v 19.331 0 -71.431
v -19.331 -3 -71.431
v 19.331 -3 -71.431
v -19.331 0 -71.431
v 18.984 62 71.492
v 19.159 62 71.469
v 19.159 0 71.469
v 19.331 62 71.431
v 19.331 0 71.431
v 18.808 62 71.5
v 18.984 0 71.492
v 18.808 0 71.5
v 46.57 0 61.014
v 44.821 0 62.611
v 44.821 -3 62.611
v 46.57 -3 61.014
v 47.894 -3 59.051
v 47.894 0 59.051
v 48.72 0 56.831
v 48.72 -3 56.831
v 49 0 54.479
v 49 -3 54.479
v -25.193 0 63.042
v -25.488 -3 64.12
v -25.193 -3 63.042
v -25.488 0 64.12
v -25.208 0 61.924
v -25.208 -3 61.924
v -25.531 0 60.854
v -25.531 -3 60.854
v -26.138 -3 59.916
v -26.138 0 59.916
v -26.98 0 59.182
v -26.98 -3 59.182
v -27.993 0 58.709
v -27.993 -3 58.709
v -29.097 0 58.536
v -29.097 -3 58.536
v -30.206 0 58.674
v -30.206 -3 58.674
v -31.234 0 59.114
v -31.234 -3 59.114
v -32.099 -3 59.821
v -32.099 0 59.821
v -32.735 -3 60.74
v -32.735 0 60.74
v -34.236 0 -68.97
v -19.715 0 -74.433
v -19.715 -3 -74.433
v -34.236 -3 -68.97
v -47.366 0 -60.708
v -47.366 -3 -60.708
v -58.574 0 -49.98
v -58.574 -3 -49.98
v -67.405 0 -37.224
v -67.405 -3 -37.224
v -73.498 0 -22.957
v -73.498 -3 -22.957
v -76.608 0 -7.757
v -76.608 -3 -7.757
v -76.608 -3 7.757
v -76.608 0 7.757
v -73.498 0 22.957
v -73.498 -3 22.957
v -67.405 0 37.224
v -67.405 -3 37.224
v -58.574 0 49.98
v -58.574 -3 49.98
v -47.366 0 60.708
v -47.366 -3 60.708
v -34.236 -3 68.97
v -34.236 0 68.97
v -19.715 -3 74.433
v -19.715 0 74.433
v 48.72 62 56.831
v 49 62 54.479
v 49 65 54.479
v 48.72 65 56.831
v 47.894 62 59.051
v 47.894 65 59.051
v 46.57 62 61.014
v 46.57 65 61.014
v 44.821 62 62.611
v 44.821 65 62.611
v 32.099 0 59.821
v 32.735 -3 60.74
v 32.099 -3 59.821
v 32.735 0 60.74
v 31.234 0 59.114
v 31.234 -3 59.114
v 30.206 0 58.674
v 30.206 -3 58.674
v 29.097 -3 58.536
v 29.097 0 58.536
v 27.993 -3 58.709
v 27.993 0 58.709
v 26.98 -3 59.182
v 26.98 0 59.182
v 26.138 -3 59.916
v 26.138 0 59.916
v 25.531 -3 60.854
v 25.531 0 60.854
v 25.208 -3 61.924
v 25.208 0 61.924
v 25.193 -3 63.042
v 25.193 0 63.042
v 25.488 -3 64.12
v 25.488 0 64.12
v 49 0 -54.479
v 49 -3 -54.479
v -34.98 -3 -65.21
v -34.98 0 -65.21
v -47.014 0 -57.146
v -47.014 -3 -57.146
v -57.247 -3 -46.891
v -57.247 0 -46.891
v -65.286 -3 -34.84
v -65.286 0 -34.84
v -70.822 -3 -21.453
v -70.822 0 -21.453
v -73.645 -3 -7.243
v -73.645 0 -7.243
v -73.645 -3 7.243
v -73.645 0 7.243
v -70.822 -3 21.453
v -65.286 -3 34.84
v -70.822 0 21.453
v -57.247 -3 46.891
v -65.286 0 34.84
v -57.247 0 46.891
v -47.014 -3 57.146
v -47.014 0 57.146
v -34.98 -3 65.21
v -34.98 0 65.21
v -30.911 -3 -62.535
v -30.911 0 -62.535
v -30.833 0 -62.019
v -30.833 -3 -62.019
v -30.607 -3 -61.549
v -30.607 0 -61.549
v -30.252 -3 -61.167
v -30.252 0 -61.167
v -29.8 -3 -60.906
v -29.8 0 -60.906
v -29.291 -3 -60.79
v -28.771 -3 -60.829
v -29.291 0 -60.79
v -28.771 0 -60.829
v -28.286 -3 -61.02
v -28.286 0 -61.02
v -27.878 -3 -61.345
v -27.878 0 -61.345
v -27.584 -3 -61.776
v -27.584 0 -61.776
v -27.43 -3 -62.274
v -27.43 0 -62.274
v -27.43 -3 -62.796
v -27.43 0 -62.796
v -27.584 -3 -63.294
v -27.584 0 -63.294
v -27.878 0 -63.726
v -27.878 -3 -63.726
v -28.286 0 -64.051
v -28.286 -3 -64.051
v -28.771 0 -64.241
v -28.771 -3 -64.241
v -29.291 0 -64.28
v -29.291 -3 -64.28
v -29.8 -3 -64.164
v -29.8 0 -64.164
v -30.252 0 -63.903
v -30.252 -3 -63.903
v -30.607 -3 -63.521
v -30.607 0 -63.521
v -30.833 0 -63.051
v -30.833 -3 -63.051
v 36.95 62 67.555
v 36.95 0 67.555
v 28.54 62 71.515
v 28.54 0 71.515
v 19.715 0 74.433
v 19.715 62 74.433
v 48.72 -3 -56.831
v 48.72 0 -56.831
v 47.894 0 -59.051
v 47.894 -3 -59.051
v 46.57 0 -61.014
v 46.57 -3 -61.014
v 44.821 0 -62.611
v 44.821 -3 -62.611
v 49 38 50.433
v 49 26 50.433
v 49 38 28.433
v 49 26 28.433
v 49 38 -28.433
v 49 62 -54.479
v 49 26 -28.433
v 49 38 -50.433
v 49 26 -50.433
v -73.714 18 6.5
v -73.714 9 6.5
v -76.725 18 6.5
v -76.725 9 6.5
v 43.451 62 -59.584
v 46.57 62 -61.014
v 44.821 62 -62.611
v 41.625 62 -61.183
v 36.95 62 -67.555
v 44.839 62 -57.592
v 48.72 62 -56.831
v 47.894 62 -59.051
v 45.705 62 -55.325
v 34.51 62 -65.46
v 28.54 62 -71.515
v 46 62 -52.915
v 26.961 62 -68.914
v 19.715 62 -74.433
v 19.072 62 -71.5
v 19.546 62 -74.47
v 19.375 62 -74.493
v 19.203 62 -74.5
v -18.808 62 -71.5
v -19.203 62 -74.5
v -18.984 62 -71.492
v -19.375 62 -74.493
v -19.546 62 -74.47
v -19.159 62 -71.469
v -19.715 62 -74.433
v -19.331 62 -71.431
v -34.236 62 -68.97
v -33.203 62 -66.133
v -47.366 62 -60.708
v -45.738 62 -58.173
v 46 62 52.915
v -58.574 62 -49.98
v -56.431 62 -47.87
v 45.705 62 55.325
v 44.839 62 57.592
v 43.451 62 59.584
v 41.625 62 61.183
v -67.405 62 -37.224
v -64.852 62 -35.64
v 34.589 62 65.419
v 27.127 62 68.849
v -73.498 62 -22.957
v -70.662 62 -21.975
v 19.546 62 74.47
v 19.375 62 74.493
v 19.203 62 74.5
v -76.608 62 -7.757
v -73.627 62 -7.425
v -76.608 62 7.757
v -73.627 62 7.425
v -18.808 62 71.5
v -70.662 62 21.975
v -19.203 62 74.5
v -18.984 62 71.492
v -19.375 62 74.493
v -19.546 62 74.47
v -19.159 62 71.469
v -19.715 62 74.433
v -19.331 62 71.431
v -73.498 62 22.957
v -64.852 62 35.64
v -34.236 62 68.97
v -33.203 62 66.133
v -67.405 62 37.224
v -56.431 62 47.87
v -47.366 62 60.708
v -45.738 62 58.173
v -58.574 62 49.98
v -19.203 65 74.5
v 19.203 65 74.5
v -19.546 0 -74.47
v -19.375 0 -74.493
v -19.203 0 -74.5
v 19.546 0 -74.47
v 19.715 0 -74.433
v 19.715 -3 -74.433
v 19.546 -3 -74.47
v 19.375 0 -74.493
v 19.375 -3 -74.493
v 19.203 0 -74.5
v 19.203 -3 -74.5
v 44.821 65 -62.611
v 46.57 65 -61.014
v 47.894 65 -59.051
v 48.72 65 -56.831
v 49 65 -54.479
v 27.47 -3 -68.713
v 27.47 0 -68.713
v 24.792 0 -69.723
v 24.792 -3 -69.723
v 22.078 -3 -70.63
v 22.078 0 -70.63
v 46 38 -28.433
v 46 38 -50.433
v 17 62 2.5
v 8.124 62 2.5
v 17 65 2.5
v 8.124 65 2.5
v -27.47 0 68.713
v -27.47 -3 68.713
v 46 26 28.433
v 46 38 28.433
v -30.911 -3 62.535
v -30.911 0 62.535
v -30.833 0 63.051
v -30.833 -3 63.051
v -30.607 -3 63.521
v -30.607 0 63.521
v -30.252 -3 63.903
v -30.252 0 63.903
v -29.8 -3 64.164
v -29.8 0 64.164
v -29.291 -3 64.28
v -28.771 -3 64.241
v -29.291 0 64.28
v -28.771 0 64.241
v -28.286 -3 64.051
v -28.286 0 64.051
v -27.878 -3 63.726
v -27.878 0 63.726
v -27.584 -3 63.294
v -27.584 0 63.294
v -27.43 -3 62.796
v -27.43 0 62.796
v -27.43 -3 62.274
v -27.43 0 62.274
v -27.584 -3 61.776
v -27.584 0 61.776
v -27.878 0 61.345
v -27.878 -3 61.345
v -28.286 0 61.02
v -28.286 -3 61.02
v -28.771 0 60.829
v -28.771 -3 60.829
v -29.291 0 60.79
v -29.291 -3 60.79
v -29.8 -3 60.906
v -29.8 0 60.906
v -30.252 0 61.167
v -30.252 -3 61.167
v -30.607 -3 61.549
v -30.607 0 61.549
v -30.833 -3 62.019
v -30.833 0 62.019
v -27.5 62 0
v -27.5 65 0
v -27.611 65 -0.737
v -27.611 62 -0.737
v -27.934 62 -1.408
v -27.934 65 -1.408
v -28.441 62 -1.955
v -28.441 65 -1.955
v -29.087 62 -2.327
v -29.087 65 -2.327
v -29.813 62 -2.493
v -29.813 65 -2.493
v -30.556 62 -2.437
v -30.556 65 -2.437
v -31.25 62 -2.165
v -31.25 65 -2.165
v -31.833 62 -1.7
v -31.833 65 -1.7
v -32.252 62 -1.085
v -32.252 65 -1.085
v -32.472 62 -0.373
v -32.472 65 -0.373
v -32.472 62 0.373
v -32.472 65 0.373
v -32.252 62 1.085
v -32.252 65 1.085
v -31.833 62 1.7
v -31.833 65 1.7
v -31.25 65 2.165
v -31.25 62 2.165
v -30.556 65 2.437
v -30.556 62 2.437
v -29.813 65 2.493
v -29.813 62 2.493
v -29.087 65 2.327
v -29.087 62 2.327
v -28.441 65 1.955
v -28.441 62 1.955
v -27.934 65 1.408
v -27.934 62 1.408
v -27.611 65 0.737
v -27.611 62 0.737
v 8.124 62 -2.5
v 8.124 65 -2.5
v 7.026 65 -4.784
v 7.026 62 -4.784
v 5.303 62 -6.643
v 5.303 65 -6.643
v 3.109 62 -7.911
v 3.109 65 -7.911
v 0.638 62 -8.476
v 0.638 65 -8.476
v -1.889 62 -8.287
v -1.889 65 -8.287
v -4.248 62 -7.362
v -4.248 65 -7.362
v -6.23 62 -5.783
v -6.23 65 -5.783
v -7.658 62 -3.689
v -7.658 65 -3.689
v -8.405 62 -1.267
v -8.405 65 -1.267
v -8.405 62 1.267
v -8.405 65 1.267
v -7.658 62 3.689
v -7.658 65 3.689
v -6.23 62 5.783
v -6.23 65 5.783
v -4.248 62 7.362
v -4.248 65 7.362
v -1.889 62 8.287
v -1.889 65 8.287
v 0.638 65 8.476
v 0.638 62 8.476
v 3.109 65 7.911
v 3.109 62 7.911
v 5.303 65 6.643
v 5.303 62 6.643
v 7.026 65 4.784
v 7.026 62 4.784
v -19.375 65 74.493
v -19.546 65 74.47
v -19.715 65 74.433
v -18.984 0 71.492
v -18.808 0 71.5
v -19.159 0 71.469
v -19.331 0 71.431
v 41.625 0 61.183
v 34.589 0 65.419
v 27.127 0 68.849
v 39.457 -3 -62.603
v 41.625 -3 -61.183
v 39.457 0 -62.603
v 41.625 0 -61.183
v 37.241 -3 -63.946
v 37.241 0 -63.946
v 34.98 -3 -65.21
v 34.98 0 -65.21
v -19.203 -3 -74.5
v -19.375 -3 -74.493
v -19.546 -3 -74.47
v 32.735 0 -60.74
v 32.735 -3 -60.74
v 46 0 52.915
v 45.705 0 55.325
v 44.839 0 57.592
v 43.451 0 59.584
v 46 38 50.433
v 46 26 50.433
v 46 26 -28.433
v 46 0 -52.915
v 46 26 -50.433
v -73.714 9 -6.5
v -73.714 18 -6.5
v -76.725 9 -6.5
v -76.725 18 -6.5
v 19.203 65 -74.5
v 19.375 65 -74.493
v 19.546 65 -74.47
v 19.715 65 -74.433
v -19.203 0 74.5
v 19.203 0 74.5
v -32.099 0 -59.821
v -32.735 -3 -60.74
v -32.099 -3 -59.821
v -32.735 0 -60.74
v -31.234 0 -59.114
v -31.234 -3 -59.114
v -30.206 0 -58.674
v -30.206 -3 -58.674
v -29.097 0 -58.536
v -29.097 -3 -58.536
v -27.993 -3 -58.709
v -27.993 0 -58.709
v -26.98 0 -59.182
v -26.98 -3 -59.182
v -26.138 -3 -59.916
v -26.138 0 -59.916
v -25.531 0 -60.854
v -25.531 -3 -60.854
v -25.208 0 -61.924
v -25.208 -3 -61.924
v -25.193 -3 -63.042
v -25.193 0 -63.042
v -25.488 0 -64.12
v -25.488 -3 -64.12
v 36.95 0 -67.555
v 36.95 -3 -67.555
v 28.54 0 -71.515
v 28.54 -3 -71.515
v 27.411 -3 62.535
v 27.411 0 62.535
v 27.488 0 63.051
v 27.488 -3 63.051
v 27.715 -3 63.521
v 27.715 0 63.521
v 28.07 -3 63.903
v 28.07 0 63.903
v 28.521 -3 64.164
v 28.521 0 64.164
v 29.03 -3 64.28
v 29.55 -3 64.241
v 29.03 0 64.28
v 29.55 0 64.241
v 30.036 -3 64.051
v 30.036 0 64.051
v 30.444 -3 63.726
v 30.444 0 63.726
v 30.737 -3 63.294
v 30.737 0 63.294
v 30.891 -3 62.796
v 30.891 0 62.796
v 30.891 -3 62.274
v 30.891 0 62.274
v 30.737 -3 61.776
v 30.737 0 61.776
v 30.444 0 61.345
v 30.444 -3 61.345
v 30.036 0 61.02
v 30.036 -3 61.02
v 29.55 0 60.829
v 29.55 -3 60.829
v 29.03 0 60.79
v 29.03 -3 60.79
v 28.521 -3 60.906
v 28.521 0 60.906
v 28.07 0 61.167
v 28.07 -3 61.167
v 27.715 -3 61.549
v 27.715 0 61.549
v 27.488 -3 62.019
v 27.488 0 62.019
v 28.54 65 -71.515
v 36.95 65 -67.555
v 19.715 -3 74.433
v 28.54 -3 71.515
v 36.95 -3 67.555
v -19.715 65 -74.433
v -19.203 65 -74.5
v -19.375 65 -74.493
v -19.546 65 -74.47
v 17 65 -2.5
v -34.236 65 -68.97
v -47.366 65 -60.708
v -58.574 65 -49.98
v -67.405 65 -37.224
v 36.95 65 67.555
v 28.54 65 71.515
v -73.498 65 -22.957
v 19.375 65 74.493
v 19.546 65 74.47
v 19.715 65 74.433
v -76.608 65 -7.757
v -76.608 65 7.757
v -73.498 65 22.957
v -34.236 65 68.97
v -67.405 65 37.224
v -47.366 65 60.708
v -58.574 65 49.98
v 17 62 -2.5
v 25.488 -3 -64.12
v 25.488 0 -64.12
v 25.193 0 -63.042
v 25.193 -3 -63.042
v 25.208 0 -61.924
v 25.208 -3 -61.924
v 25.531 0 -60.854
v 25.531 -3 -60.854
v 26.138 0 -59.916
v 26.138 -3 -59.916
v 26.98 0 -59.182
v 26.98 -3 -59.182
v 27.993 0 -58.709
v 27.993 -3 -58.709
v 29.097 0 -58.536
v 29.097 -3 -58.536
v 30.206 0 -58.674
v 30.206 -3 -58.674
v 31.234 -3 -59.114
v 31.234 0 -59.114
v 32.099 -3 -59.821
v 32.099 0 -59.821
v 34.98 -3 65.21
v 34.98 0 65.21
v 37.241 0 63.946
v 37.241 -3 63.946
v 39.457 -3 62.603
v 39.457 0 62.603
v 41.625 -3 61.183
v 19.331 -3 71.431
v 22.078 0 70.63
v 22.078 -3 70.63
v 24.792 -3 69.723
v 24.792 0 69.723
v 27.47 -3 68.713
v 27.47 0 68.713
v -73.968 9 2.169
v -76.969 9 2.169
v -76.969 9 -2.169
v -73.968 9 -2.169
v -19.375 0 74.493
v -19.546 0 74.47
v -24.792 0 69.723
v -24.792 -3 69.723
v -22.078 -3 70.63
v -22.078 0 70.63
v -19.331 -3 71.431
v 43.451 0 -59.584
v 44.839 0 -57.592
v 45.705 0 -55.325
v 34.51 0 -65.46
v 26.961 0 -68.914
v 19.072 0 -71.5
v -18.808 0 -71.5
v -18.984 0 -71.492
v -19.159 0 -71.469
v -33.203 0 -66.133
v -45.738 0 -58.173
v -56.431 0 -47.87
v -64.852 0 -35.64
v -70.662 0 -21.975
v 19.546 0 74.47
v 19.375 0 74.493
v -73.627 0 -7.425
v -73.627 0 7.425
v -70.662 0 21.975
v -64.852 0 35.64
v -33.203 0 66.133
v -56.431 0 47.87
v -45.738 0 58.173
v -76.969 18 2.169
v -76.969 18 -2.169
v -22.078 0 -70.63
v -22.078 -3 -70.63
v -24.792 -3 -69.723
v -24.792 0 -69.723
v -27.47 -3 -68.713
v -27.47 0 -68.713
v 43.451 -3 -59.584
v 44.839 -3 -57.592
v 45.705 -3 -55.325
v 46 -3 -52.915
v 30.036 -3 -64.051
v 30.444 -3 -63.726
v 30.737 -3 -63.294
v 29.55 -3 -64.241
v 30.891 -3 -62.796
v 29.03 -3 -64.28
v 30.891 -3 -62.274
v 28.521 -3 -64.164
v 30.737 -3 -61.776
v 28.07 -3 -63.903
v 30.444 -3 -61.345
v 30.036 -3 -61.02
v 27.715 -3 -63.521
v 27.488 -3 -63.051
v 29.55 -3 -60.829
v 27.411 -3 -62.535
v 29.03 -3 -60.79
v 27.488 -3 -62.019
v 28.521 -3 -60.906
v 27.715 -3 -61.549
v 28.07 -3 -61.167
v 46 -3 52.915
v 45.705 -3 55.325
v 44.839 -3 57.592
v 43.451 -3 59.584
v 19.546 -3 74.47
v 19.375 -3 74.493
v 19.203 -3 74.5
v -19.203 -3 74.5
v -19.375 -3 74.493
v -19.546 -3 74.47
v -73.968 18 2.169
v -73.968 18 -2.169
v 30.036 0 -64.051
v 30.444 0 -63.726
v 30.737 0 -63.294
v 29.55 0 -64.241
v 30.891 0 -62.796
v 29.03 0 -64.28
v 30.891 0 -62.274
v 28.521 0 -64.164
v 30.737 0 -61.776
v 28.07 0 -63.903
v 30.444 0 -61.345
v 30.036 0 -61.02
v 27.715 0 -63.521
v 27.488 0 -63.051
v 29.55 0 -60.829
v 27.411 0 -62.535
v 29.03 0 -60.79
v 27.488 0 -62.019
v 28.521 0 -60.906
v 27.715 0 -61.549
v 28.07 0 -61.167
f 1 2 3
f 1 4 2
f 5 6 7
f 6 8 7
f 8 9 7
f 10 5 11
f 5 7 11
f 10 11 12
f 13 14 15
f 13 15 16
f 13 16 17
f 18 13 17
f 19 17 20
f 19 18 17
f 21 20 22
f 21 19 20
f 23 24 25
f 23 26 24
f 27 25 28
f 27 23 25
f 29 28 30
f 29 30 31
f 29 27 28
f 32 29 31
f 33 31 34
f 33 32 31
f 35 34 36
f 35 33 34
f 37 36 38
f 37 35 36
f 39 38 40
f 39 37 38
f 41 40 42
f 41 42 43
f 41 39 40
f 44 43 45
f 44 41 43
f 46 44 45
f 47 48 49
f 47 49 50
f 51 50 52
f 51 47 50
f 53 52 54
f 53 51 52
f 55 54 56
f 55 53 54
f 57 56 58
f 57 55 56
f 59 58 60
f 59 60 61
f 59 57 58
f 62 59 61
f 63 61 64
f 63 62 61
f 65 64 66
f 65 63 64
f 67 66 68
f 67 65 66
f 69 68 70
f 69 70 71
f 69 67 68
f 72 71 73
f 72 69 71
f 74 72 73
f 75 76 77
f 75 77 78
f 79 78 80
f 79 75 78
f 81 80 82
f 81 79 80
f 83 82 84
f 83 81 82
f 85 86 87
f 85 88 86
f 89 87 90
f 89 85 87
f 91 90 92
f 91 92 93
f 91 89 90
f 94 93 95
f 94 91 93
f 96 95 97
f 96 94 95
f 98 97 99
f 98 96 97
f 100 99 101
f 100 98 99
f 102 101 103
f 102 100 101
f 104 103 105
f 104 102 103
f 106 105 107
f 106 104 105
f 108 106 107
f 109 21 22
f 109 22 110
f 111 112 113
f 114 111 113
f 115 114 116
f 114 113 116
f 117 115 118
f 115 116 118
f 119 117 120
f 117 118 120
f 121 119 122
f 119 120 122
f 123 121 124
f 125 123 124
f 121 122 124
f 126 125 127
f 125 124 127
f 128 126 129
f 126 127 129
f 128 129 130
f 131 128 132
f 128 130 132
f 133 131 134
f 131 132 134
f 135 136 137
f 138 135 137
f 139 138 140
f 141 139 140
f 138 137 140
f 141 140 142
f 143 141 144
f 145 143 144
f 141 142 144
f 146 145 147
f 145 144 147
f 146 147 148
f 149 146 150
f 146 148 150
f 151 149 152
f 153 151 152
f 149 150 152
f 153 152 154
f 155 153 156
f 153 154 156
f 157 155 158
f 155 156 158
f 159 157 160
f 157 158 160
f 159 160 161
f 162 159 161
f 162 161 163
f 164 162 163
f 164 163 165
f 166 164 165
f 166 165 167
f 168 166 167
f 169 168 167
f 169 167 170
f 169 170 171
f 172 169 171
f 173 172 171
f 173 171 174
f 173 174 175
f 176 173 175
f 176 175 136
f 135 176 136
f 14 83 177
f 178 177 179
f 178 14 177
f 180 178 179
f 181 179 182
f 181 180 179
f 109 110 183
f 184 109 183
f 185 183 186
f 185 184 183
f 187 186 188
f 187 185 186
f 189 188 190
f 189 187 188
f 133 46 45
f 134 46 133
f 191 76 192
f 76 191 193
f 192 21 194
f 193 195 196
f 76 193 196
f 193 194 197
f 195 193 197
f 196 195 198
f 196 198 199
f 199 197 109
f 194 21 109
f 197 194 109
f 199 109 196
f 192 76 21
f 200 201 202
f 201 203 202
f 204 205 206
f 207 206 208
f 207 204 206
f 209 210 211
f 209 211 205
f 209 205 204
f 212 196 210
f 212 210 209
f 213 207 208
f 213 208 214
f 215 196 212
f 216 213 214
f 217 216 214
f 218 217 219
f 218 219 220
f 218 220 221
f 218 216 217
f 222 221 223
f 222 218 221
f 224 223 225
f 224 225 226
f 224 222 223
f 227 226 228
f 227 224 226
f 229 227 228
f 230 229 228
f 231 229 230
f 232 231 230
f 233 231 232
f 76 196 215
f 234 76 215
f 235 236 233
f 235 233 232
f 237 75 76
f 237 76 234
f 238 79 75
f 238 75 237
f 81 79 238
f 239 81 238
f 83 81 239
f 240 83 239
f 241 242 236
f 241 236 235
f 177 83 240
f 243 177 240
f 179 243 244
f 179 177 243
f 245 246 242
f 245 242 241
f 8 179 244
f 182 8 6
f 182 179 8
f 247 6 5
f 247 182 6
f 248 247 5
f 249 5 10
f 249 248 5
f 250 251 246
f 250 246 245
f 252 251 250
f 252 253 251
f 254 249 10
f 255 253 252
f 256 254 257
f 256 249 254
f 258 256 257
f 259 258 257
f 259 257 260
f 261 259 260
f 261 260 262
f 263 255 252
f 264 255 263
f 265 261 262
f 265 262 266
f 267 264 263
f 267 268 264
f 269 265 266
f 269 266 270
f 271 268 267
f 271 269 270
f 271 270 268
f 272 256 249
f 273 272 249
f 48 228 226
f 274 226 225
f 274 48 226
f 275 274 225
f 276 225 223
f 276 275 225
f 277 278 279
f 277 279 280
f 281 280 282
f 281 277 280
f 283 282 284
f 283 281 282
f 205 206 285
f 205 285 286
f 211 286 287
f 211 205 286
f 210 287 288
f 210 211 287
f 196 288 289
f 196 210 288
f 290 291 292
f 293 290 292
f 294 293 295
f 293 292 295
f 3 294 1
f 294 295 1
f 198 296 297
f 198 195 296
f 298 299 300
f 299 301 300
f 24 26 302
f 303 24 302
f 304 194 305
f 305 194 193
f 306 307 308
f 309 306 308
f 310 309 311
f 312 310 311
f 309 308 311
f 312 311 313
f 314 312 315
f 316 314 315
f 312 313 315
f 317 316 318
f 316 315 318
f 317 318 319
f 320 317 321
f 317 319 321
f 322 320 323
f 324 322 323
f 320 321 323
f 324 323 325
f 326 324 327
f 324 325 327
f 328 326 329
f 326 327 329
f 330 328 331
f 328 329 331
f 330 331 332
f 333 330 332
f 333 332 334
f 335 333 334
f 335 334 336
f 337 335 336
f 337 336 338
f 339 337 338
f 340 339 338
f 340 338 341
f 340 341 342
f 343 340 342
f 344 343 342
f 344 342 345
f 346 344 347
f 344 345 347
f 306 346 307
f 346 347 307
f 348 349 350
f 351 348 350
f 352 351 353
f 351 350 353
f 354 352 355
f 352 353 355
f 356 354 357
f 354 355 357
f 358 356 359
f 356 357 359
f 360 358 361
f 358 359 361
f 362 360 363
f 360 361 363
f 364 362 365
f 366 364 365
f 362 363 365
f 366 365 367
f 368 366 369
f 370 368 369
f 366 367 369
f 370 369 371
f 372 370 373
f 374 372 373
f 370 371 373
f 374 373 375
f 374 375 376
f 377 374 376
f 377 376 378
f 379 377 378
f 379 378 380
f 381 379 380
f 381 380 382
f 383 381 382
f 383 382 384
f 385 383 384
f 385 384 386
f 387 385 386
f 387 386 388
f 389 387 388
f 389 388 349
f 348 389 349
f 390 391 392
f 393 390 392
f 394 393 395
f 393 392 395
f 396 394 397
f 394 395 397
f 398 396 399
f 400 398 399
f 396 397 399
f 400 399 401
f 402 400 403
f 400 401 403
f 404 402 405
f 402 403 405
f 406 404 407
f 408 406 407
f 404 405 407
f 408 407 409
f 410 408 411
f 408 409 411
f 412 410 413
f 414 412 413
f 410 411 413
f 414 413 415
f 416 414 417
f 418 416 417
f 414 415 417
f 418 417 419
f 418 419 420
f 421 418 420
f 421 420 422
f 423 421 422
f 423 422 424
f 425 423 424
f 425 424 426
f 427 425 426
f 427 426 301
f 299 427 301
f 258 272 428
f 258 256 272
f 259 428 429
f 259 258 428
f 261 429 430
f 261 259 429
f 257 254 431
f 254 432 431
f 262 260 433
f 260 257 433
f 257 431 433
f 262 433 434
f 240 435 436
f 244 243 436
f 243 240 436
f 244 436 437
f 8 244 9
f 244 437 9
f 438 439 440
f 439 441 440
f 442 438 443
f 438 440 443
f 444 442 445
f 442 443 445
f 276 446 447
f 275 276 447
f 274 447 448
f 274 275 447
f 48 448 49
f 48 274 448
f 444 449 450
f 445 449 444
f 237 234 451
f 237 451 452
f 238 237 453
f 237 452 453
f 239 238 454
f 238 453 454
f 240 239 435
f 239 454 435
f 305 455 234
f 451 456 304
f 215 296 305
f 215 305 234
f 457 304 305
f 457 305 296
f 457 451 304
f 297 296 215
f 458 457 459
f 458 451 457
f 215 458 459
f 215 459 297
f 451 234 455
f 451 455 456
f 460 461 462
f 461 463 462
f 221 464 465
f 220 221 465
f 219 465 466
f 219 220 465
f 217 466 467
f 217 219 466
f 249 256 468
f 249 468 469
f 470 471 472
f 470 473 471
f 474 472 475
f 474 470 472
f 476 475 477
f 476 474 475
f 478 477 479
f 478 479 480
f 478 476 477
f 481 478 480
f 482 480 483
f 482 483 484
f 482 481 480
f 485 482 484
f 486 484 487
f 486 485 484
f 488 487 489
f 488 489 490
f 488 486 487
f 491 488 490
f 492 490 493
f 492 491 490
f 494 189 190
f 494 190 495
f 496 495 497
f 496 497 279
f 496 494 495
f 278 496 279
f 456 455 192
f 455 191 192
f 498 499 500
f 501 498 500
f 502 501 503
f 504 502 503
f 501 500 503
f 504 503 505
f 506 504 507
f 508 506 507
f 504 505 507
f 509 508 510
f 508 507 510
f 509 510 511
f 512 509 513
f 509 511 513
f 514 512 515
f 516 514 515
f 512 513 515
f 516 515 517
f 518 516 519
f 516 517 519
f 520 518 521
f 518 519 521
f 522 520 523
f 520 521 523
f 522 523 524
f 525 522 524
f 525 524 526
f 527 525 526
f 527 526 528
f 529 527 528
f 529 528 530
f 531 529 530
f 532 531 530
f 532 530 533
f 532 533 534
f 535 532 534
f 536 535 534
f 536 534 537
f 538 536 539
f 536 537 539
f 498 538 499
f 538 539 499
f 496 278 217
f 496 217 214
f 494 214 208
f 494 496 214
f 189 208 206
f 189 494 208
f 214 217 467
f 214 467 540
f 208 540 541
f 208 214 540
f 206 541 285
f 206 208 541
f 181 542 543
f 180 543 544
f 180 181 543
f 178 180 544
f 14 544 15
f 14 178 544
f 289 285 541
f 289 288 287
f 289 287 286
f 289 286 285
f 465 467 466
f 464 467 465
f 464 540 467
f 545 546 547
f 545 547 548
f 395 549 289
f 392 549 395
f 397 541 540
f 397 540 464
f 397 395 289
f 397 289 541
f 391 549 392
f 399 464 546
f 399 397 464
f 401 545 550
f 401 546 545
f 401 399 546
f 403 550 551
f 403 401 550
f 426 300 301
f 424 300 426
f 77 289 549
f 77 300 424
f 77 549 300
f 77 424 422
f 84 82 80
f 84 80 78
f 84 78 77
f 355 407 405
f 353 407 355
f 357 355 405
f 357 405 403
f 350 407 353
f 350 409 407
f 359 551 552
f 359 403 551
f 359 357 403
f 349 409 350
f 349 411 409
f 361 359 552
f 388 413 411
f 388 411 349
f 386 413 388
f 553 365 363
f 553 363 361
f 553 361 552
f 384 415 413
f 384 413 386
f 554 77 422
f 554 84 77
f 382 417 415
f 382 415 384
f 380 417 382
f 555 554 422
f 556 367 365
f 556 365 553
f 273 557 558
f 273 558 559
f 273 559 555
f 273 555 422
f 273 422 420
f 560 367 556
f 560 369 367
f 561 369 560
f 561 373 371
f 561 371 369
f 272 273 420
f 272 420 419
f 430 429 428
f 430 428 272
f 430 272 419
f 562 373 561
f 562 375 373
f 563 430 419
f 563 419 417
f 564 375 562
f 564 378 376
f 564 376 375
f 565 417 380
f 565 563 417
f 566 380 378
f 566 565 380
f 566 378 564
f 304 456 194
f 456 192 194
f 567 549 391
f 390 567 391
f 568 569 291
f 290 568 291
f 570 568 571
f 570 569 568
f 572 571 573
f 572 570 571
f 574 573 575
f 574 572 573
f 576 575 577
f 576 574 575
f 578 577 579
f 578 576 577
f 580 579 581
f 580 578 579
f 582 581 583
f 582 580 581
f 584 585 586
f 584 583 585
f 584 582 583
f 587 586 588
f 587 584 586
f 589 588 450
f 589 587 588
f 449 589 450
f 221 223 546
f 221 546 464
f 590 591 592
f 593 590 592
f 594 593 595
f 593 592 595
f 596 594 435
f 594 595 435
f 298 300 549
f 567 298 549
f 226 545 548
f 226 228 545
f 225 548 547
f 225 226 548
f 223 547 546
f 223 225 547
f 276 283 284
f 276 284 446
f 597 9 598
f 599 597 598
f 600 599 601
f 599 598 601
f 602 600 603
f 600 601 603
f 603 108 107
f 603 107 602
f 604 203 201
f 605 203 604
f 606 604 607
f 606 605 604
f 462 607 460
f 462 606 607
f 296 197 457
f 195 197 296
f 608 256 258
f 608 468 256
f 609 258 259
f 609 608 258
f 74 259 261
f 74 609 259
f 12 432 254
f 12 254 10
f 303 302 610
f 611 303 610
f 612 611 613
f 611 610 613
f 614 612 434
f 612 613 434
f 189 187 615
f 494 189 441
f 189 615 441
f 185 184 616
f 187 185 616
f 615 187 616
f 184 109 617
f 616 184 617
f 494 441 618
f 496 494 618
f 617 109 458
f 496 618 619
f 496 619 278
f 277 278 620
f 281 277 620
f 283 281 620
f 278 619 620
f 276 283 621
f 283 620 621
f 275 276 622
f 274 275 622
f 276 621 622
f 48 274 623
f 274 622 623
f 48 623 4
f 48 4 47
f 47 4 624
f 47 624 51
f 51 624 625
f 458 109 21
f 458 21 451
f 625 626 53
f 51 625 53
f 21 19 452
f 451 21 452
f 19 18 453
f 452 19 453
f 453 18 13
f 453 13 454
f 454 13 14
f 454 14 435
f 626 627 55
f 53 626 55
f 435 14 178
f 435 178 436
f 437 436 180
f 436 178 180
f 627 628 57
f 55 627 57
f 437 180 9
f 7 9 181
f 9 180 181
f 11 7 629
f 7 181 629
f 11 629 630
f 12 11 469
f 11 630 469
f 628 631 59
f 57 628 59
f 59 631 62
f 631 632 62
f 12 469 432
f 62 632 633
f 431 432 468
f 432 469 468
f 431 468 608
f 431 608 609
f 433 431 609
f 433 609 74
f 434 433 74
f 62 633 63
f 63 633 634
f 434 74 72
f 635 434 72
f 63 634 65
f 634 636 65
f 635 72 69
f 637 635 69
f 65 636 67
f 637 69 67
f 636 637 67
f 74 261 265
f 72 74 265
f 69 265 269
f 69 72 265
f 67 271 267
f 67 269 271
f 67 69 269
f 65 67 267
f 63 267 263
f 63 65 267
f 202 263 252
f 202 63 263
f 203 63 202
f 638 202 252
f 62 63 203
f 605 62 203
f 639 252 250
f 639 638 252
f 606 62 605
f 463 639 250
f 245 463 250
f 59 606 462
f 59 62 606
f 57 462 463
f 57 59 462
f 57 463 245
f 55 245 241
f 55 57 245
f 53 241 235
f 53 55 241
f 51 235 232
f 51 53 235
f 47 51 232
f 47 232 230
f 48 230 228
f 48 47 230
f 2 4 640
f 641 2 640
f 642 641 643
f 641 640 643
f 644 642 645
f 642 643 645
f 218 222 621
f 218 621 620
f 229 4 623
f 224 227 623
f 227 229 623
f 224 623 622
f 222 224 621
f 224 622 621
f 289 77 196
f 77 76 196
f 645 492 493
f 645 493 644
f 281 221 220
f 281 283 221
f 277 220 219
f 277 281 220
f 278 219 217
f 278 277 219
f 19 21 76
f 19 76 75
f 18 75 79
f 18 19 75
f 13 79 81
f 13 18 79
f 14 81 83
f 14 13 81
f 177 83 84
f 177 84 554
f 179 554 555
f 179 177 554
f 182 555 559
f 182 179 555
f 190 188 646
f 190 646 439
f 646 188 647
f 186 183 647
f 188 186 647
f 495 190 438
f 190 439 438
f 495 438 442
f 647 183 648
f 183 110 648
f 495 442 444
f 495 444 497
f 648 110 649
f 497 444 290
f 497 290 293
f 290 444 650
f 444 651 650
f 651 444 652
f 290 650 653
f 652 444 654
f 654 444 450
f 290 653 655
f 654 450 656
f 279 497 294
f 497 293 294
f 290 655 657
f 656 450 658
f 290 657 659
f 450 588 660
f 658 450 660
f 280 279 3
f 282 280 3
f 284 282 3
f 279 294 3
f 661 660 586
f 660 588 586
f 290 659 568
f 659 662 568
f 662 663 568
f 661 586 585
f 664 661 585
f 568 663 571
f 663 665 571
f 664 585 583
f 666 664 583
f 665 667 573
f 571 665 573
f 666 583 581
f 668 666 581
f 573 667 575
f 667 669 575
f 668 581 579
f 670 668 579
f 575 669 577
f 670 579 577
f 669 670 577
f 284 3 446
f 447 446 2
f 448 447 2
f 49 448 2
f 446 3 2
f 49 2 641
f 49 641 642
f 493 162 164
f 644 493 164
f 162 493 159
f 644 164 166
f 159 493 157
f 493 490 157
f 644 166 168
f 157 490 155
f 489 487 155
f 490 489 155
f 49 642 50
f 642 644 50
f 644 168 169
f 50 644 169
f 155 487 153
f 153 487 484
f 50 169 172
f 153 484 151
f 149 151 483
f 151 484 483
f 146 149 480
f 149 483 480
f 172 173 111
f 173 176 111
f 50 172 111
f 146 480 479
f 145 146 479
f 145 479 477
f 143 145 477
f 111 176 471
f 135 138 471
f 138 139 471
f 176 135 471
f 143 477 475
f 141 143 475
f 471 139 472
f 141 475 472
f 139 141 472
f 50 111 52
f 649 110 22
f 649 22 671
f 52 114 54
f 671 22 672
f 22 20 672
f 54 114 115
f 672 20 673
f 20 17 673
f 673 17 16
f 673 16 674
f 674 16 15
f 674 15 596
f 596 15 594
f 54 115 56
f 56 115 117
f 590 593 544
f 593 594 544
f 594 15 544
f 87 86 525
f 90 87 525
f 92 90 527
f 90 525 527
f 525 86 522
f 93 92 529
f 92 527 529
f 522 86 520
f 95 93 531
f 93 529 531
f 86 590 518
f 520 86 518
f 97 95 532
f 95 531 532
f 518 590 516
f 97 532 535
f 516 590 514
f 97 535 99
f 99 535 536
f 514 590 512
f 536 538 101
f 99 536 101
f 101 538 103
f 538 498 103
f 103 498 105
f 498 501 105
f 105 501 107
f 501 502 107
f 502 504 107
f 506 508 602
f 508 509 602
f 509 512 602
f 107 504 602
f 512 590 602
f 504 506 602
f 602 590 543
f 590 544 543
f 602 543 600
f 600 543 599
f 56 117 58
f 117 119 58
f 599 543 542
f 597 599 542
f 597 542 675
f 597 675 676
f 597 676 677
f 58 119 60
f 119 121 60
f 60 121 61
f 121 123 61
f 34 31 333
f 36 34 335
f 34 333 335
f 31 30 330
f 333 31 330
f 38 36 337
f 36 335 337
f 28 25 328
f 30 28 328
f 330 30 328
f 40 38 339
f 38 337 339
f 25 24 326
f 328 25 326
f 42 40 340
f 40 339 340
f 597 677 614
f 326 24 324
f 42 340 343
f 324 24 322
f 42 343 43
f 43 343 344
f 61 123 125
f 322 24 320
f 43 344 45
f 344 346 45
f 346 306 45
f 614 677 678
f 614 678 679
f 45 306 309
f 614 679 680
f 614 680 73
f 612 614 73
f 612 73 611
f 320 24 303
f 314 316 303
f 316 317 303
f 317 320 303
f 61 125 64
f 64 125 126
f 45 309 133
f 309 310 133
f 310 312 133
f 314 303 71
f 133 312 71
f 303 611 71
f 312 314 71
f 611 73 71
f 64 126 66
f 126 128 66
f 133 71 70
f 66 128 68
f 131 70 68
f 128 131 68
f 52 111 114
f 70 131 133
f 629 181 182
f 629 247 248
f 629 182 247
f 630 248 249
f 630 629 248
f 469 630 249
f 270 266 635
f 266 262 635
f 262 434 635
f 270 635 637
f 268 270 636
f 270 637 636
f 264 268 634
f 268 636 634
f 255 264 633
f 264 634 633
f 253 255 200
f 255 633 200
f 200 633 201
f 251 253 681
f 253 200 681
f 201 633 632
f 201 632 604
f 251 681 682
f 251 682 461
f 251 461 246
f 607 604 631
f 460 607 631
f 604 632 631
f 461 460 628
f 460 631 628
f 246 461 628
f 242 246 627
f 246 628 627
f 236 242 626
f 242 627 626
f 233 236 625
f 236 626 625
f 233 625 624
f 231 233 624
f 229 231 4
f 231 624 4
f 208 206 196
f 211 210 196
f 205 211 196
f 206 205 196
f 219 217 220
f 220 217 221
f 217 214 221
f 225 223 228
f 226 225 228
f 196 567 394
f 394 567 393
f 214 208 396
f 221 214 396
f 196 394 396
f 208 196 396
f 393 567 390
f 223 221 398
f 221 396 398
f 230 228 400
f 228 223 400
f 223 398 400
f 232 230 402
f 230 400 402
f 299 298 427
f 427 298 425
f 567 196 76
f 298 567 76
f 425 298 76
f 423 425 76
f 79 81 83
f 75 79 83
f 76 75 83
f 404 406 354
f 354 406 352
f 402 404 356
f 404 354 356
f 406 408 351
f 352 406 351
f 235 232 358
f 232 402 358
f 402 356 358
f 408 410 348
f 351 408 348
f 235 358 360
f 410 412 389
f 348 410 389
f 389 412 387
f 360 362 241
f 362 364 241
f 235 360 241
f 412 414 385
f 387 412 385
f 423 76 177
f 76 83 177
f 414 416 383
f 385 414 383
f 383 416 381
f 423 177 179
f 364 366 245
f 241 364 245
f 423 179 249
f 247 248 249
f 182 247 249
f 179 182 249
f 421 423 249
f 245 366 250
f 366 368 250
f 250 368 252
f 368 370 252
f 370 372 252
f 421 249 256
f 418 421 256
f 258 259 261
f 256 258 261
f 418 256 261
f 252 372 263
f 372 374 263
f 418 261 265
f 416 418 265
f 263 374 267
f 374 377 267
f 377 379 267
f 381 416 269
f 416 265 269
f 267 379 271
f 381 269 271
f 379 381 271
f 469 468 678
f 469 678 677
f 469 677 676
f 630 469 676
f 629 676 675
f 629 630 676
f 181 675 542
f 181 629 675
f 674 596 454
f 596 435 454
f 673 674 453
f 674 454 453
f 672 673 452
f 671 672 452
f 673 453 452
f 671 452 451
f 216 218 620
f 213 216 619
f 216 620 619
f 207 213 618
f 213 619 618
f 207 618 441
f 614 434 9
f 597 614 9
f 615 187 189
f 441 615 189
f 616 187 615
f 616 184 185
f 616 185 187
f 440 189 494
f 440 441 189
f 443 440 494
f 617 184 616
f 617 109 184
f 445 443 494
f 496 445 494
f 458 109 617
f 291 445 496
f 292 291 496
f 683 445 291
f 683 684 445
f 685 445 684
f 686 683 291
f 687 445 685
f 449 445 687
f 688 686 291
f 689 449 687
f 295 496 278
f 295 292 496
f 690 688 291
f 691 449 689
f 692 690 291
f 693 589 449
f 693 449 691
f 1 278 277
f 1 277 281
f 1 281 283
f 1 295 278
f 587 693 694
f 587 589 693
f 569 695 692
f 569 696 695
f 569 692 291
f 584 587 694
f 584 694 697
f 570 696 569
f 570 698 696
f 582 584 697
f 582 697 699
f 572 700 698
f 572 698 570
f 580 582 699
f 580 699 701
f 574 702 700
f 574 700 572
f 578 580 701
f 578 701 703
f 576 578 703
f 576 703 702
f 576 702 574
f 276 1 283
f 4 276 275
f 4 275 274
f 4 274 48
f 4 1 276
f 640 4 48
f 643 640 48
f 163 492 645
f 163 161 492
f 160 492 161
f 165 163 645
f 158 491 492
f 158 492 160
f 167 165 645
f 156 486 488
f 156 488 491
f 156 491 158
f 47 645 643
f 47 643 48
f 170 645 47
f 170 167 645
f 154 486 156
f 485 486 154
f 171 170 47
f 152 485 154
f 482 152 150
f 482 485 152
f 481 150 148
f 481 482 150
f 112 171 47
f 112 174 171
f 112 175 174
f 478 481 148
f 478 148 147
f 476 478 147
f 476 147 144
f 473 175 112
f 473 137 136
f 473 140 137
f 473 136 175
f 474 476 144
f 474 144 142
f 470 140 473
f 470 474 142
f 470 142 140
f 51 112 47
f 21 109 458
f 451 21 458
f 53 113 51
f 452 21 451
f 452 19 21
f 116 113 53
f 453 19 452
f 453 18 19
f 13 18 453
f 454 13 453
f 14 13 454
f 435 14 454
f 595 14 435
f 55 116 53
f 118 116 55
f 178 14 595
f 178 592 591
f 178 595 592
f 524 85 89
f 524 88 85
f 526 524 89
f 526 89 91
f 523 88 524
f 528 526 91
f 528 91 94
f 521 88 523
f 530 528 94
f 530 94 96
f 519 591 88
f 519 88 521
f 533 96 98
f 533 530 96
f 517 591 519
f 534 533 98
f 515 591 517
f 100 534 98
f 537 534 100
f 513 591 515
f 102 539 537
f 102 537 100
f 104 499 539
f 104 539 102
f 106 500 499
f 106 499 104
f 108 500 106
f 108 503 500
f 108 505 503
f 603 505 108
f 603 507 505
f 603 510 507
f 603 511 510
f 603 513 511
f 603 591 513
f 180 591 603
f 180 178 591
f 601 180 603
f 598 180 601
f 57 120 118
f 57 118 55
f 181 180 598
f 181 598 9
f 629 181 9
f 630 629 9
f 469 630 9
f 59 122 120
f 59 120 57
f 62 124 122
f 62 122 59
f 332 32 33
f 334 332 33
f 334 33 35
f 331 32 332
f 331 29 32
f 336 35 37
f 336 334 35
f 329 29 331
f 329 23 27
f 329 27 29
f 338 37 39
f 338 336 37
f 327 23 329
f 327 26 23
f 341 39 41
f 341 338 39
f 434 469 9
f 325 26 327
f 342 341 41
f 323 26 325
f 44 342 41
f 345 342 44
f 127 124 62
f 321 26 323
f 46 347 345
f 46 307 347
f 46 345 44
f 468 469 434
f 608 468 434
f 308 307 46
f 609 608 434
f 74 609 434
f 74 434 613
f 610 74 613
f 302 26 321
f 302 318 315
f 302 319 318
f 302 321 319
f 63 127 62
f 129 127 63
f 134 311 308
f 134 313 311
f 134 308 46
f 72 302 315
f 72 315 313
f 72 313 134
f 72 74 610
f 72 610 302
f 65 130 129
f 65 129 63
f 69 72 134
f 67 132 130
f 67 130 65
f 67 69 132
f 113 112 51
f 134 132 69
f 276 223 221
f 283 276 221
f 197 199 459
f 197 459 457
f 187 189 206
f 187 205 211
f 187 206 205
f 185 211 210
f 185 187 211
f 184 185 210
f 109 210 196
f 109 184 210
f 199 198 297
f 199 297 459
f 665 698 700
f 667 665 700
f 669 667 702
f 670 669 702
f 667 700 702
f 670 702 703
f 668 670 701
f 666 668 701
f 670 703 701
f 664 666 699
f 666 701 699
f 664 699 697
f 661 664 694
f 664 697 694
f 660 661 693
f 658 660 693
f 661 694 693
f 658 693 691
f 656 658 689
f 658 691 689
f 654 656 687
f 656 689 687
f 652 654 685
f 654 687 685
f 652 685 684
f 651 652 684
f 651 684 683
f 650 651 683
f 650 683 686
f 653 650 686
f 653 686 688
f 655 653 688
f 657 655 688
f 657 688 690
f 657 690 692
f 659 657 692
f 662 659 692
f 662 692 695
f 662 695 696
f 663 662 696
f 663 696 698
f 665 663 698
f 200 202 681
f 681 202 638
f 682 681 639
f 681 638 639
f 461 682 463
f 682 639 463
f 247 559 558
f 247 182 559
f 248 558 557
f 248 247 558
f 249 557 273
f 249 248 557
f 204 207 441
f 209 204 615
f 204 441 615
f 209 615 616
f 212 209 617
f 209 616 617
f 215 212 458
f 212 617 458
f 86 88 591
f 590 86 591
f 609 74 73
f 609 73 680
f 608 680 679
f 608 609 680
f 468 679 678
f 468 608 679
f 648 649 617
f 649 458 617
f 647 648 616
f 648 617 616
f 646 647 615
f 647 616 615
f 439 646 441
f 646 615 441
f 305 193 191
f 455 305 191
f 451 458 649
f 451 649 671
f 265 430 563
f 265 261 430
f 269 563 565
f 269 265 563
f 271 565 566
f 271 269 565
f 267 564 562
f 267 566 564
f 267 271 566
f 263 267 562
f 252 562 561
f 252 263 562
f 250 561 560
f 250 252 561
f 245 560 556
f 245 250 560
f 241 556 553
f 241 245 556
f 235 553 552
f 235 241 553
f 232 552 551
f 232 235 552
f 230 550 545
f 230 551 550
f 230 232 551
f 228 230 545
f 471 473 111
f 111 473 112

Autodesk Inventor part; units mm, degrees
ref_plane "YZ Plane" through (0, 0, 0) normal (1, 0, 0) x (0, 1, 0)
ref_plane "XZ Plane" through (0, 0, 0) normal (0, 1, 0) x (-1, 0, 0)
sketch "Sketch1" plane through (0, 0, 0) normal (0, 1, 0) x (-1, 0, 0)
  line L0 (18.8082, 71.5) -> (-18.8082, 71.5)
  line L1 (0, 0) -> (-49, 0) construction
  line L2 (19.2029, 74.5) -> (-19.2029, 74.5)
  line L3 (18.8082, -71.5) -> (-19.0722, -71.5)
  line L4 (19.2029, -74.5) -> (-19.2029, -74.5)
  line L5 (0, 0) -> (0, 74.5) construction
  line L6 (-46, 52.915) -> (-46, -52.915)
  line L7 (-49, 54.4794) -> (-49, -54.4794)
  arc A0 (-41.625, -61.183) -> (-19.0722, -71.5) centre (0, 0) ccw
  arc A1 (-44.8209, -62.6106) -> (-19.7149, -74.4333) centre (0, 0) ccw
  arc A2 (19.7149, -74.4333) -> (19.7149, 74.4333) centre (0, 0) ccw
  arc A3 (-19.7149, 74.4333) -> (-44.8209, 62.6106) centre (0, 0) ccw
  arc A4 (19.3307, -71.4306) -> (19.3307, 71.4306) centre (0, 0) ccw
  arc A5 (-19.3307, 71.4306) -> (-41.625, 61.183) centre (0, 0) ccw
  arc A6 (-19.7149, -74.4333) -> (-19.2029, -74.5) centre (-19.2029, -72.5) ccw
  arc A7 (19.2029, -74.5) -> (19.7149, -74.4333) centre (19.2029, -72.5) ccw
  arc A8 (18.8082, -71.5) -> (19.3307, -71.4306) centre (18.8082, -69.5) ccw
  arc A9 (19.3307, 71.4306) -> (18.8082, 71.5) centre (18.8082, 69.5) ccw
  arc A10 (19.7149, 74.4333) -> (19.2029, 74.5) centre (19.2029, 72.5) ccw
  arc A11 (-18.8082, 71.5) -> (-19.3307, 71.4306) centre (-18.8082, 69.5) ccw
  arc A12 (-19.2029, 74.5) -> (-19.7149, 74.4333) centre (-19.2029, 72.5) ccw
  arc A13 (-41.625, 61.183) -> (-46, 52.915) centre (-36, 52.915) ccw
  arc A14 (-44.8209, 62.6106) -> (-49, 54.4794) centre (-39, 54.4794) ccw
  arc A15 (-49, -54.4794) -> (-44.8209, -62.6106) centre (-39, -54.4794) ccw
  arc A16 (-46, -52.915) -> (-41.625, -61.183) centre (-36, -52.915) ccw
  point P0 (-19.4615, 74.5)
  point P1 (19.0722, -71.5)
  point P2 (19.4615, -74.5)
  point P3 (-19.4615, -74.5)
  point P4 (-49, -59.397)
  point P5 (-46, 57.9655)
  point P6 (-46, -57.9655)
  point P7 (-49, 59.397)
  point P8 (19.4615, 74.5)
  point P9 (19.0722, 71.5)
  point P10 (-19.0722, 71.5)
  dimension "d2" = 71.5
  dimension "d4" = 3
  dimension "d6" = 46
  dimension "d7" = 3
  dimension "d8" = 2
  dimension "d9" = 10
  dimension "d10" = 74
  dimension "d11" = 77
  dimension "d12" = 74
  dimension "d13" = 77
extrude "Extrusion1" add sketch "Sketch1" along normal blind 62
sketch "Sketch2" plane through (49, 0, 54.4794) normal (1, 0, 0) x (0, 0, -1)
  line L0 (54.4794, 0) -> (54.4794, 62) construction
  line L1 (107.3944, 62) -> (1.5643, 62) projected
  line L2 (0, 0) -> (108.9587, 0) projected
  line L3 (-19.954, 0) -> (-19.954, 62) projected
  line L4 (54.4794, 0) -> (54.4794, 62)
  line L5 (54.4794, 0) -> (54.4794, 26)
  line L6 (54.4794, 26) -> (26.0464, 26)
  line L7 (26.0464, 26) -> (26.0464, 38)
  line L8 (26.0464, 38) -> (4.0464, 38)
  line L9 (4.0464, 38) -> (4.0464, 26)
  line L10 (4.0464, 26) -> (26.0464, 26)
  line L11 (82.9124, 26) -> (82.9124, 38)
  line L12 (82.9124, 38) -> (104.9124, 38)
  line L13 (104.9124, 38) -> (104.9124, 26)
  line L14 (104.9124, 26) -> (82.9124, 26)
  dimension "d240" = 26
  dimension "d241" = 28.433
  dimension "d242" = 12
  dimension "d243" = 22
  dimension "d244" = 12
extrude "Extrusion2" cut sketch "Sketch2" against normal blind 13.25
sketch "Sketch3" plane through (49, 0, 54.4794) normal (1, 0, 0) x (0, 0, -1)
  line L0 (3.568, 49.2223) -> (17.7975, 43.9952) construction
  line L1 (2.8909, 47.379) -> (17.1204, 42.1519)
  line L2 (18.4746, 45.8385) -> (4.2452, 51.0656)
  arc A0 (4.2452, 51.0656) -> (2.8909, 47.379) centre (3.568, 49.2223) ccw
  arc A1 (17.1204, 42.1519) -> (18.4746, 45.8385) centre (17.7975, 43.9952) ccw
  arc A2 (44.4296, 11.624) -> (34.6921, 2.9774) centre (43.8866, 2.4292) ccw construction
  arc A3 (44.531, 13.3402) -> (32.9759, 3.0797) centre (43.8866, 2.4292) ccw
  arc A4 (44.3283, 9.9077) -> (36.4083, 2.8751) centre (43.8866, 2.4292) ccw
  arc A5 (44.3283, 9.9077) -> (44.531, 13.3402) centre (44.4296, 11.624) ccw
  arc A6 (32.9759, 3.0797) -> (36.4083, 2.8751) centre (34.6921, 2.9774) ccw
  line L3 (54.4794, 0) -> (54.4794, 62) construction
  line L4 (106.0678, 47.379) -> (91.8383, 42.1519)
  line L5 (90.4841, 45.8385) -> (104.7135, 51.0656)
  arc A7 (106.0678, 47.379) -> (104.7135, 51.0656) centre (105.3907, 49.2223) ccw
  arc A8 (90.4841, 45.8385) -> (91.8383, 42.1519) centre (91.1612, 43.9952) ccw
  point P0 (10.6828, 46.6088)
extrude "Extrusion3" [suppressed]
extrude "Extrusion4" add sketch "Sketch1" along normal blind 3 from surface at 62 separate body contours A9 A4 A8 L3 A0 A16 L6 A13 A5 A11 L0 | A10 A2 A7 L4 A6 A1 A15 L7 A14 A3 A12 L2
sketch "Sketch5" plane through (-19.2029, 65, 74.5) normal (0, 1, 0) x (1, 0, 0)
  circle A0 centre (19.2029, 74.5) radius 8.5
  circle A1 centre (-10.7971, 74.5) radius 2.5
  line L0 (27.3269, 72) -> (36.2029, 72)
  line L1 (36.2029, 72) -> (36.2029, 77)
  line L2 (36.2029, 77) -> (27.3269, 77)
  line L3 (36.2029, 74.5) -> (68.2029, 74.5)
  line L4 (68.2029, 20.0206) -> (68.2029, 128.9794) projected
  line L5 (-10.7971, 74.5) -> (-57.7971, 74.5)
  arc A2 (-0.5121, 148.9333) -> (-0.5121, 0.0667) centre (19.2029, 74.5) ccw projected
  dimension "d26" = 17
  dimension "d27" = 5
  dimension "d31" = 5
  dimension "d32" = 17
  dimension "d47" = 30
  dimension "d204" = 32
  dimension "d205" = 47
  dimension "d206" = 49
extrude "Extrusion5" cut sketch "Sketch5" against normal through all
sketch "Sketch6" plane through (0, 0, 0) normal (0, 1, 0) x (-1, 0, 0)
  circle A0 centre (0, 0) radius 69 construction
  arc A1 (-19.3307, 71.4306) -> (-41.625, 61.183) centre (0, 0) ccw projected
  arc A2 (-41.625, 61.183) -> (-46, 52.915) centre (-36, 52.915) ccw projected
  line L0 (-46, -52.915) -> (-46, 52.915) projected
  arc A3 (-46, -52.915) -> (-41.625, -61.183) centre (-36, -52.915) ccw projected
  arc A4 (-41.625, -61.183) -> (-19.0722, -71.5) centre (0, 0) ccw projected
  line L1 (18.8082, -71.5) -> (-19.0722, -71.5) construction
  arc A5 (19.3307, -71.4306) -> (19.3307, 71.4306) centre (0, 0) ccw projected
  line L2 (-18.8082, 71.5) -> (18.8082, 71.5) construction
  line L3 (19.2029, 74.5) -> (-19.2029, 74.5) projected
  arc A6 (-19.7149, 74.4333) -> (-44.8209, 62.6106) centre (0, 0) ccw projected
  arc A7 (-44.8209, 62.6106) -> (-49, 54.4794) centre (-39, 54.4794) ccw projected
  line L4 (-49, 54.4794) -> (-49, -54.4794) projected
  arc A8 (-49, -54.4794) -> (-44.8209, -62.6106) centre (-39, -54.4794) ccw projected
  arc A9 (-44.8209, -62.6106) -> (-19.7149, -74.4333) centre (0, 0) ccw projected
  line L5 (-19.2029, -74.5) -> (19.2029, -74.5) projected
  arc A10 (19.7149, -74.4333) -> (19.7149, 74.4333) centre (0, 0) ccw projected
  arc A11 (-18.5383, 65.4242) -> (-38.25, 56.2222) centre (0, 0) ccw construction
  arc A12 (-38.25, 56.2222) -> (-40, 52.915) centre (-36, 52.915) ccw construction
  line L6 (-40, 52.915) -> (-40, -52.915) construction
  arc A13 (-40, -52.915) -> (-38.25, -56.2222) centre (-36, -52.915) ccw construction
  arc A14 (-38.25, -56.2222) -> (-18.5383, -65.4242) centre (0, 0) ccw construction
  line L7 (-17.9931, -65.5) -> (17.9931, -65.5) construction
  line L8 (-17.9931, 65.5) -> (17.9931, 65.5) construction
  arc A15 (18.5383, -65.4242) -> (18.5383, 65.4242) centre (0, 0) ccw construction
  arc A16 (-8.124, -2.5) -> (-8.124, 2.5) centre (0, 0) ccw projected
  line L9 (0, 0) -> (52.8571, 44.3523) construction
  line L10 (0, 0) -> (77, 0) construction
  line L11 (0, 0) -> (0, -69) construction
  circle A17 centre (29.1607, 62.5352) radius 3 construction
  line L12 (29.1607, 62.5352) -> (0, 0) construction
  circle A18 centre (-29.1607, 62.5352) radius 3 construction
  line L13 (-29.1607, 62.5352) -> (0, 0) construction
  arc A19 (-17.9931, 65.5) -> (-18.5383, 65.4242) centre (-17.9931, 63.5) ccw construction
  arc A20 (-18.5383, -65.4242) -> (-17.9931, -65.5) centre (-17.9931, -63.5) ccw construction
  arc A21 (17.9931, -65.5) -> (18.5383, -65.4242) centre (17.9931, -63.5) ccw construction
  arc A22 (18.5383, 65.4242) -> (17.9931, 65.5) centre (17.9931, 63.5) ccw construction
  arc A23 (-19.7149, -74.4333) -> (-19.2029, -74.5) centre (-19.2029, -72.5) ccw projected
  arc A24 (19.2029, -74.5) -> (19.7149, -74.4333) centre (19.2029, -72.5) ccw projected
  arc A25 (19.7149, 74.4333) -> (19.2029, 74.5) centre (19.2029, 72.5) ccw projected
  arc A26 (-19.2029, 74.5) -> (-19.7149, 74.4333) centre (-19.2029, 72.5) ccw projected
  circle A27 centre (29.1607, -62.5352) radius 3 construction
  circle A28 centre (-29.1607, -62.5352) radius 3 construction
  line L14 (19.3307, 65.1945) -> (19.3307, 71.4306)
  line L15 (-19.3307, 65.1945) -> (-19.3307, 71.4306)
  line L16 (19.3307, 71.4306) -> (-19.3307, 71.4306)
  line L17 (19.3307, -65.1945) -> (19.3307, -71.4306)
  line L18 (-19.3307, -65.1945) -> (-19.3307, -71.4306)
  line L19 (19.3307, -71.4306) -> (-19.3307, -71.4306)
  circle A29 centre (29.1607, 62.5352) radius 4
  circle A30 centre (-29.1607, 62.5352) radius 4
  line L20 (-32.7354, 60.7404) -> (-34.9798, 65.2105)
  circle A31 centre (29.1607, -62.5352) radius 4
  circle A32 centre (-29.1607, -62.5352) radius 4
  line L21 (-32.7354, -60.7404) -> (-34.9798, -65.2105)
  line L22 (32.7354, 60.7404) -> (34.9798, 65.2105)
  line L23 (32.7354, -60.7404) -> (34.9798, -65.2105)
  line L24 (-25.488, 64.1199) -> (-27.4696, 68.7126)
  line L25 (25.488, 64.1199) -> (27.4696, 68.7126)
  line L26 (-25.488, -64.1199) -> (-27.4696, -68.7126)
  line L27 (25.488, -64.1199) -> (27.4696, -68.7126)
  line L28 (-18.8082, 71.5) -> (-49, 71.5)
  line L29 (-49, 71.5) -> (-49, 54.4794)
  line L30 (-28.5788, 71.5) -> (-18.8082, 71.5)
  circle A33 centre (-29.1607, -62.5352) radius 1.75
  circle A34 centre (29.1607, -62.5352) radius 1.75
  circle A35 centre (29.1607, 62.5352) radius 1.75
  circle A36 centre (-29.1607, 62.5352) radius 1.75
  point P0 (-18.2688, -65.5)
  point P1 (-19.3307, 65.1945)
  point P2 (-19.3307, -65.1945)
  point P3 (29.1607, 62.5352)
  point P4 (26.7032, 60.8145)
  point P5 (-46, 24)
  point P6 (-46, 16)
  point P7 (-29.4221, 59.5467)
  point P8 (-19.3307, -71.4306)
  point P9 (-34.9798, -65.2105)
  point P10 (34.9798, -65.2105)
  point P11 (-27.9581, 66.3502)
  point P12 (-27.9581, -66.3502)
  point P13 (27.9581, -66.3502)
  point P14 (27.9581, 66.3502)
  point P15 (-32.8561, 64.0662)
  point P16 (32.8561, -64.0662)
  point P17 (-32.8561, -64.0662)
  point P18 (32.8561, 64.0662)
  point P19 (25.488, -64.1199)
  point P20 (27.4696, -68.7126)
  point P21 (-25.488, -64.1199)
  point P22 (34.0084, -67.0387)
  point P23 (-28.5882, -71.3052)
  point P24 (28.5882, -71.3052)
  point P25 (28.5882, 71.3052)
  point P26 (-28.5882, 71.3052)
  point P27 (34.0084, 67.0387)
  point P28 (-19.3307, -71.4306)
  point P29 (-34.0084, -67.0387)
  point P30 (-34.0084, 67.0387)
  dimension "d33" = 138
  dimension "d229" = 6
  dimension "d34" = 6
  dimension "d35" = 6
  dimension "d36" = 6
  dimension "d37" = 40
  dimension "d38" = 25
  dimension "d42" = 25
  dimension "d44" = 2
  dimension "d62" = 8
  dimension "d64" = 8
  dimension "d171" = 90
  dimension "d172" = 17.0206
  dimension "d227" = 3.5
  dimension "d228" = 3.5
  dimension "d230" = 3.5
  dimension "d231" = 3.5
extrude "Extrusion6" add sketch "Sketch6" against normal blind 3 separate body contours L24 A30 L20 A1 | A30 | A5 L22 A29 L25 | A29 | A5 L27 A31 L23 | A31 | L21 A32 L26 A4 | A32 | A25 A10 A24 L5 A23 A9 A8 L4 A7 A6 A26 L3
ref_plane "Work Plane2" through (-77, 0, 0) normal (-1, 0, 0) x (0, 0, 1)
sketch "Sketch20" plane through (-77, 0, 0) normal (-1, 0, 0) x (0, 0, 1)
  line L0 (-54.4794, -3) -> (54.4794, -3) projected
  line L1 (0, -3) -> (0, 9)
  line L2 (0, 9) -> (0, 18)
  line L3 (0, 18) -> (6.5, 18)
  line L4 (0, 9) -> (-6.5, 9)
  line L5 (-6.5, 9) -> (6.5, 9)
  line L6 (6.5, 9) -> (6.5, 18)
  line L7 (6.5, 18) -> (-6.5, 18)
  line L8 (-6.5, 18) -> (-6.5, 9)
  point P0 (0, 0)
  dimension "d215" = 12
  dimension "d216" = 9
  dimension "d217" = 6.5
  dimension "d218" = 6.5
extrude "Extrusion16" cut sketch "Sketch20" against normal blind 10.75 bodies 1
properties part number "carcasa4.0"
